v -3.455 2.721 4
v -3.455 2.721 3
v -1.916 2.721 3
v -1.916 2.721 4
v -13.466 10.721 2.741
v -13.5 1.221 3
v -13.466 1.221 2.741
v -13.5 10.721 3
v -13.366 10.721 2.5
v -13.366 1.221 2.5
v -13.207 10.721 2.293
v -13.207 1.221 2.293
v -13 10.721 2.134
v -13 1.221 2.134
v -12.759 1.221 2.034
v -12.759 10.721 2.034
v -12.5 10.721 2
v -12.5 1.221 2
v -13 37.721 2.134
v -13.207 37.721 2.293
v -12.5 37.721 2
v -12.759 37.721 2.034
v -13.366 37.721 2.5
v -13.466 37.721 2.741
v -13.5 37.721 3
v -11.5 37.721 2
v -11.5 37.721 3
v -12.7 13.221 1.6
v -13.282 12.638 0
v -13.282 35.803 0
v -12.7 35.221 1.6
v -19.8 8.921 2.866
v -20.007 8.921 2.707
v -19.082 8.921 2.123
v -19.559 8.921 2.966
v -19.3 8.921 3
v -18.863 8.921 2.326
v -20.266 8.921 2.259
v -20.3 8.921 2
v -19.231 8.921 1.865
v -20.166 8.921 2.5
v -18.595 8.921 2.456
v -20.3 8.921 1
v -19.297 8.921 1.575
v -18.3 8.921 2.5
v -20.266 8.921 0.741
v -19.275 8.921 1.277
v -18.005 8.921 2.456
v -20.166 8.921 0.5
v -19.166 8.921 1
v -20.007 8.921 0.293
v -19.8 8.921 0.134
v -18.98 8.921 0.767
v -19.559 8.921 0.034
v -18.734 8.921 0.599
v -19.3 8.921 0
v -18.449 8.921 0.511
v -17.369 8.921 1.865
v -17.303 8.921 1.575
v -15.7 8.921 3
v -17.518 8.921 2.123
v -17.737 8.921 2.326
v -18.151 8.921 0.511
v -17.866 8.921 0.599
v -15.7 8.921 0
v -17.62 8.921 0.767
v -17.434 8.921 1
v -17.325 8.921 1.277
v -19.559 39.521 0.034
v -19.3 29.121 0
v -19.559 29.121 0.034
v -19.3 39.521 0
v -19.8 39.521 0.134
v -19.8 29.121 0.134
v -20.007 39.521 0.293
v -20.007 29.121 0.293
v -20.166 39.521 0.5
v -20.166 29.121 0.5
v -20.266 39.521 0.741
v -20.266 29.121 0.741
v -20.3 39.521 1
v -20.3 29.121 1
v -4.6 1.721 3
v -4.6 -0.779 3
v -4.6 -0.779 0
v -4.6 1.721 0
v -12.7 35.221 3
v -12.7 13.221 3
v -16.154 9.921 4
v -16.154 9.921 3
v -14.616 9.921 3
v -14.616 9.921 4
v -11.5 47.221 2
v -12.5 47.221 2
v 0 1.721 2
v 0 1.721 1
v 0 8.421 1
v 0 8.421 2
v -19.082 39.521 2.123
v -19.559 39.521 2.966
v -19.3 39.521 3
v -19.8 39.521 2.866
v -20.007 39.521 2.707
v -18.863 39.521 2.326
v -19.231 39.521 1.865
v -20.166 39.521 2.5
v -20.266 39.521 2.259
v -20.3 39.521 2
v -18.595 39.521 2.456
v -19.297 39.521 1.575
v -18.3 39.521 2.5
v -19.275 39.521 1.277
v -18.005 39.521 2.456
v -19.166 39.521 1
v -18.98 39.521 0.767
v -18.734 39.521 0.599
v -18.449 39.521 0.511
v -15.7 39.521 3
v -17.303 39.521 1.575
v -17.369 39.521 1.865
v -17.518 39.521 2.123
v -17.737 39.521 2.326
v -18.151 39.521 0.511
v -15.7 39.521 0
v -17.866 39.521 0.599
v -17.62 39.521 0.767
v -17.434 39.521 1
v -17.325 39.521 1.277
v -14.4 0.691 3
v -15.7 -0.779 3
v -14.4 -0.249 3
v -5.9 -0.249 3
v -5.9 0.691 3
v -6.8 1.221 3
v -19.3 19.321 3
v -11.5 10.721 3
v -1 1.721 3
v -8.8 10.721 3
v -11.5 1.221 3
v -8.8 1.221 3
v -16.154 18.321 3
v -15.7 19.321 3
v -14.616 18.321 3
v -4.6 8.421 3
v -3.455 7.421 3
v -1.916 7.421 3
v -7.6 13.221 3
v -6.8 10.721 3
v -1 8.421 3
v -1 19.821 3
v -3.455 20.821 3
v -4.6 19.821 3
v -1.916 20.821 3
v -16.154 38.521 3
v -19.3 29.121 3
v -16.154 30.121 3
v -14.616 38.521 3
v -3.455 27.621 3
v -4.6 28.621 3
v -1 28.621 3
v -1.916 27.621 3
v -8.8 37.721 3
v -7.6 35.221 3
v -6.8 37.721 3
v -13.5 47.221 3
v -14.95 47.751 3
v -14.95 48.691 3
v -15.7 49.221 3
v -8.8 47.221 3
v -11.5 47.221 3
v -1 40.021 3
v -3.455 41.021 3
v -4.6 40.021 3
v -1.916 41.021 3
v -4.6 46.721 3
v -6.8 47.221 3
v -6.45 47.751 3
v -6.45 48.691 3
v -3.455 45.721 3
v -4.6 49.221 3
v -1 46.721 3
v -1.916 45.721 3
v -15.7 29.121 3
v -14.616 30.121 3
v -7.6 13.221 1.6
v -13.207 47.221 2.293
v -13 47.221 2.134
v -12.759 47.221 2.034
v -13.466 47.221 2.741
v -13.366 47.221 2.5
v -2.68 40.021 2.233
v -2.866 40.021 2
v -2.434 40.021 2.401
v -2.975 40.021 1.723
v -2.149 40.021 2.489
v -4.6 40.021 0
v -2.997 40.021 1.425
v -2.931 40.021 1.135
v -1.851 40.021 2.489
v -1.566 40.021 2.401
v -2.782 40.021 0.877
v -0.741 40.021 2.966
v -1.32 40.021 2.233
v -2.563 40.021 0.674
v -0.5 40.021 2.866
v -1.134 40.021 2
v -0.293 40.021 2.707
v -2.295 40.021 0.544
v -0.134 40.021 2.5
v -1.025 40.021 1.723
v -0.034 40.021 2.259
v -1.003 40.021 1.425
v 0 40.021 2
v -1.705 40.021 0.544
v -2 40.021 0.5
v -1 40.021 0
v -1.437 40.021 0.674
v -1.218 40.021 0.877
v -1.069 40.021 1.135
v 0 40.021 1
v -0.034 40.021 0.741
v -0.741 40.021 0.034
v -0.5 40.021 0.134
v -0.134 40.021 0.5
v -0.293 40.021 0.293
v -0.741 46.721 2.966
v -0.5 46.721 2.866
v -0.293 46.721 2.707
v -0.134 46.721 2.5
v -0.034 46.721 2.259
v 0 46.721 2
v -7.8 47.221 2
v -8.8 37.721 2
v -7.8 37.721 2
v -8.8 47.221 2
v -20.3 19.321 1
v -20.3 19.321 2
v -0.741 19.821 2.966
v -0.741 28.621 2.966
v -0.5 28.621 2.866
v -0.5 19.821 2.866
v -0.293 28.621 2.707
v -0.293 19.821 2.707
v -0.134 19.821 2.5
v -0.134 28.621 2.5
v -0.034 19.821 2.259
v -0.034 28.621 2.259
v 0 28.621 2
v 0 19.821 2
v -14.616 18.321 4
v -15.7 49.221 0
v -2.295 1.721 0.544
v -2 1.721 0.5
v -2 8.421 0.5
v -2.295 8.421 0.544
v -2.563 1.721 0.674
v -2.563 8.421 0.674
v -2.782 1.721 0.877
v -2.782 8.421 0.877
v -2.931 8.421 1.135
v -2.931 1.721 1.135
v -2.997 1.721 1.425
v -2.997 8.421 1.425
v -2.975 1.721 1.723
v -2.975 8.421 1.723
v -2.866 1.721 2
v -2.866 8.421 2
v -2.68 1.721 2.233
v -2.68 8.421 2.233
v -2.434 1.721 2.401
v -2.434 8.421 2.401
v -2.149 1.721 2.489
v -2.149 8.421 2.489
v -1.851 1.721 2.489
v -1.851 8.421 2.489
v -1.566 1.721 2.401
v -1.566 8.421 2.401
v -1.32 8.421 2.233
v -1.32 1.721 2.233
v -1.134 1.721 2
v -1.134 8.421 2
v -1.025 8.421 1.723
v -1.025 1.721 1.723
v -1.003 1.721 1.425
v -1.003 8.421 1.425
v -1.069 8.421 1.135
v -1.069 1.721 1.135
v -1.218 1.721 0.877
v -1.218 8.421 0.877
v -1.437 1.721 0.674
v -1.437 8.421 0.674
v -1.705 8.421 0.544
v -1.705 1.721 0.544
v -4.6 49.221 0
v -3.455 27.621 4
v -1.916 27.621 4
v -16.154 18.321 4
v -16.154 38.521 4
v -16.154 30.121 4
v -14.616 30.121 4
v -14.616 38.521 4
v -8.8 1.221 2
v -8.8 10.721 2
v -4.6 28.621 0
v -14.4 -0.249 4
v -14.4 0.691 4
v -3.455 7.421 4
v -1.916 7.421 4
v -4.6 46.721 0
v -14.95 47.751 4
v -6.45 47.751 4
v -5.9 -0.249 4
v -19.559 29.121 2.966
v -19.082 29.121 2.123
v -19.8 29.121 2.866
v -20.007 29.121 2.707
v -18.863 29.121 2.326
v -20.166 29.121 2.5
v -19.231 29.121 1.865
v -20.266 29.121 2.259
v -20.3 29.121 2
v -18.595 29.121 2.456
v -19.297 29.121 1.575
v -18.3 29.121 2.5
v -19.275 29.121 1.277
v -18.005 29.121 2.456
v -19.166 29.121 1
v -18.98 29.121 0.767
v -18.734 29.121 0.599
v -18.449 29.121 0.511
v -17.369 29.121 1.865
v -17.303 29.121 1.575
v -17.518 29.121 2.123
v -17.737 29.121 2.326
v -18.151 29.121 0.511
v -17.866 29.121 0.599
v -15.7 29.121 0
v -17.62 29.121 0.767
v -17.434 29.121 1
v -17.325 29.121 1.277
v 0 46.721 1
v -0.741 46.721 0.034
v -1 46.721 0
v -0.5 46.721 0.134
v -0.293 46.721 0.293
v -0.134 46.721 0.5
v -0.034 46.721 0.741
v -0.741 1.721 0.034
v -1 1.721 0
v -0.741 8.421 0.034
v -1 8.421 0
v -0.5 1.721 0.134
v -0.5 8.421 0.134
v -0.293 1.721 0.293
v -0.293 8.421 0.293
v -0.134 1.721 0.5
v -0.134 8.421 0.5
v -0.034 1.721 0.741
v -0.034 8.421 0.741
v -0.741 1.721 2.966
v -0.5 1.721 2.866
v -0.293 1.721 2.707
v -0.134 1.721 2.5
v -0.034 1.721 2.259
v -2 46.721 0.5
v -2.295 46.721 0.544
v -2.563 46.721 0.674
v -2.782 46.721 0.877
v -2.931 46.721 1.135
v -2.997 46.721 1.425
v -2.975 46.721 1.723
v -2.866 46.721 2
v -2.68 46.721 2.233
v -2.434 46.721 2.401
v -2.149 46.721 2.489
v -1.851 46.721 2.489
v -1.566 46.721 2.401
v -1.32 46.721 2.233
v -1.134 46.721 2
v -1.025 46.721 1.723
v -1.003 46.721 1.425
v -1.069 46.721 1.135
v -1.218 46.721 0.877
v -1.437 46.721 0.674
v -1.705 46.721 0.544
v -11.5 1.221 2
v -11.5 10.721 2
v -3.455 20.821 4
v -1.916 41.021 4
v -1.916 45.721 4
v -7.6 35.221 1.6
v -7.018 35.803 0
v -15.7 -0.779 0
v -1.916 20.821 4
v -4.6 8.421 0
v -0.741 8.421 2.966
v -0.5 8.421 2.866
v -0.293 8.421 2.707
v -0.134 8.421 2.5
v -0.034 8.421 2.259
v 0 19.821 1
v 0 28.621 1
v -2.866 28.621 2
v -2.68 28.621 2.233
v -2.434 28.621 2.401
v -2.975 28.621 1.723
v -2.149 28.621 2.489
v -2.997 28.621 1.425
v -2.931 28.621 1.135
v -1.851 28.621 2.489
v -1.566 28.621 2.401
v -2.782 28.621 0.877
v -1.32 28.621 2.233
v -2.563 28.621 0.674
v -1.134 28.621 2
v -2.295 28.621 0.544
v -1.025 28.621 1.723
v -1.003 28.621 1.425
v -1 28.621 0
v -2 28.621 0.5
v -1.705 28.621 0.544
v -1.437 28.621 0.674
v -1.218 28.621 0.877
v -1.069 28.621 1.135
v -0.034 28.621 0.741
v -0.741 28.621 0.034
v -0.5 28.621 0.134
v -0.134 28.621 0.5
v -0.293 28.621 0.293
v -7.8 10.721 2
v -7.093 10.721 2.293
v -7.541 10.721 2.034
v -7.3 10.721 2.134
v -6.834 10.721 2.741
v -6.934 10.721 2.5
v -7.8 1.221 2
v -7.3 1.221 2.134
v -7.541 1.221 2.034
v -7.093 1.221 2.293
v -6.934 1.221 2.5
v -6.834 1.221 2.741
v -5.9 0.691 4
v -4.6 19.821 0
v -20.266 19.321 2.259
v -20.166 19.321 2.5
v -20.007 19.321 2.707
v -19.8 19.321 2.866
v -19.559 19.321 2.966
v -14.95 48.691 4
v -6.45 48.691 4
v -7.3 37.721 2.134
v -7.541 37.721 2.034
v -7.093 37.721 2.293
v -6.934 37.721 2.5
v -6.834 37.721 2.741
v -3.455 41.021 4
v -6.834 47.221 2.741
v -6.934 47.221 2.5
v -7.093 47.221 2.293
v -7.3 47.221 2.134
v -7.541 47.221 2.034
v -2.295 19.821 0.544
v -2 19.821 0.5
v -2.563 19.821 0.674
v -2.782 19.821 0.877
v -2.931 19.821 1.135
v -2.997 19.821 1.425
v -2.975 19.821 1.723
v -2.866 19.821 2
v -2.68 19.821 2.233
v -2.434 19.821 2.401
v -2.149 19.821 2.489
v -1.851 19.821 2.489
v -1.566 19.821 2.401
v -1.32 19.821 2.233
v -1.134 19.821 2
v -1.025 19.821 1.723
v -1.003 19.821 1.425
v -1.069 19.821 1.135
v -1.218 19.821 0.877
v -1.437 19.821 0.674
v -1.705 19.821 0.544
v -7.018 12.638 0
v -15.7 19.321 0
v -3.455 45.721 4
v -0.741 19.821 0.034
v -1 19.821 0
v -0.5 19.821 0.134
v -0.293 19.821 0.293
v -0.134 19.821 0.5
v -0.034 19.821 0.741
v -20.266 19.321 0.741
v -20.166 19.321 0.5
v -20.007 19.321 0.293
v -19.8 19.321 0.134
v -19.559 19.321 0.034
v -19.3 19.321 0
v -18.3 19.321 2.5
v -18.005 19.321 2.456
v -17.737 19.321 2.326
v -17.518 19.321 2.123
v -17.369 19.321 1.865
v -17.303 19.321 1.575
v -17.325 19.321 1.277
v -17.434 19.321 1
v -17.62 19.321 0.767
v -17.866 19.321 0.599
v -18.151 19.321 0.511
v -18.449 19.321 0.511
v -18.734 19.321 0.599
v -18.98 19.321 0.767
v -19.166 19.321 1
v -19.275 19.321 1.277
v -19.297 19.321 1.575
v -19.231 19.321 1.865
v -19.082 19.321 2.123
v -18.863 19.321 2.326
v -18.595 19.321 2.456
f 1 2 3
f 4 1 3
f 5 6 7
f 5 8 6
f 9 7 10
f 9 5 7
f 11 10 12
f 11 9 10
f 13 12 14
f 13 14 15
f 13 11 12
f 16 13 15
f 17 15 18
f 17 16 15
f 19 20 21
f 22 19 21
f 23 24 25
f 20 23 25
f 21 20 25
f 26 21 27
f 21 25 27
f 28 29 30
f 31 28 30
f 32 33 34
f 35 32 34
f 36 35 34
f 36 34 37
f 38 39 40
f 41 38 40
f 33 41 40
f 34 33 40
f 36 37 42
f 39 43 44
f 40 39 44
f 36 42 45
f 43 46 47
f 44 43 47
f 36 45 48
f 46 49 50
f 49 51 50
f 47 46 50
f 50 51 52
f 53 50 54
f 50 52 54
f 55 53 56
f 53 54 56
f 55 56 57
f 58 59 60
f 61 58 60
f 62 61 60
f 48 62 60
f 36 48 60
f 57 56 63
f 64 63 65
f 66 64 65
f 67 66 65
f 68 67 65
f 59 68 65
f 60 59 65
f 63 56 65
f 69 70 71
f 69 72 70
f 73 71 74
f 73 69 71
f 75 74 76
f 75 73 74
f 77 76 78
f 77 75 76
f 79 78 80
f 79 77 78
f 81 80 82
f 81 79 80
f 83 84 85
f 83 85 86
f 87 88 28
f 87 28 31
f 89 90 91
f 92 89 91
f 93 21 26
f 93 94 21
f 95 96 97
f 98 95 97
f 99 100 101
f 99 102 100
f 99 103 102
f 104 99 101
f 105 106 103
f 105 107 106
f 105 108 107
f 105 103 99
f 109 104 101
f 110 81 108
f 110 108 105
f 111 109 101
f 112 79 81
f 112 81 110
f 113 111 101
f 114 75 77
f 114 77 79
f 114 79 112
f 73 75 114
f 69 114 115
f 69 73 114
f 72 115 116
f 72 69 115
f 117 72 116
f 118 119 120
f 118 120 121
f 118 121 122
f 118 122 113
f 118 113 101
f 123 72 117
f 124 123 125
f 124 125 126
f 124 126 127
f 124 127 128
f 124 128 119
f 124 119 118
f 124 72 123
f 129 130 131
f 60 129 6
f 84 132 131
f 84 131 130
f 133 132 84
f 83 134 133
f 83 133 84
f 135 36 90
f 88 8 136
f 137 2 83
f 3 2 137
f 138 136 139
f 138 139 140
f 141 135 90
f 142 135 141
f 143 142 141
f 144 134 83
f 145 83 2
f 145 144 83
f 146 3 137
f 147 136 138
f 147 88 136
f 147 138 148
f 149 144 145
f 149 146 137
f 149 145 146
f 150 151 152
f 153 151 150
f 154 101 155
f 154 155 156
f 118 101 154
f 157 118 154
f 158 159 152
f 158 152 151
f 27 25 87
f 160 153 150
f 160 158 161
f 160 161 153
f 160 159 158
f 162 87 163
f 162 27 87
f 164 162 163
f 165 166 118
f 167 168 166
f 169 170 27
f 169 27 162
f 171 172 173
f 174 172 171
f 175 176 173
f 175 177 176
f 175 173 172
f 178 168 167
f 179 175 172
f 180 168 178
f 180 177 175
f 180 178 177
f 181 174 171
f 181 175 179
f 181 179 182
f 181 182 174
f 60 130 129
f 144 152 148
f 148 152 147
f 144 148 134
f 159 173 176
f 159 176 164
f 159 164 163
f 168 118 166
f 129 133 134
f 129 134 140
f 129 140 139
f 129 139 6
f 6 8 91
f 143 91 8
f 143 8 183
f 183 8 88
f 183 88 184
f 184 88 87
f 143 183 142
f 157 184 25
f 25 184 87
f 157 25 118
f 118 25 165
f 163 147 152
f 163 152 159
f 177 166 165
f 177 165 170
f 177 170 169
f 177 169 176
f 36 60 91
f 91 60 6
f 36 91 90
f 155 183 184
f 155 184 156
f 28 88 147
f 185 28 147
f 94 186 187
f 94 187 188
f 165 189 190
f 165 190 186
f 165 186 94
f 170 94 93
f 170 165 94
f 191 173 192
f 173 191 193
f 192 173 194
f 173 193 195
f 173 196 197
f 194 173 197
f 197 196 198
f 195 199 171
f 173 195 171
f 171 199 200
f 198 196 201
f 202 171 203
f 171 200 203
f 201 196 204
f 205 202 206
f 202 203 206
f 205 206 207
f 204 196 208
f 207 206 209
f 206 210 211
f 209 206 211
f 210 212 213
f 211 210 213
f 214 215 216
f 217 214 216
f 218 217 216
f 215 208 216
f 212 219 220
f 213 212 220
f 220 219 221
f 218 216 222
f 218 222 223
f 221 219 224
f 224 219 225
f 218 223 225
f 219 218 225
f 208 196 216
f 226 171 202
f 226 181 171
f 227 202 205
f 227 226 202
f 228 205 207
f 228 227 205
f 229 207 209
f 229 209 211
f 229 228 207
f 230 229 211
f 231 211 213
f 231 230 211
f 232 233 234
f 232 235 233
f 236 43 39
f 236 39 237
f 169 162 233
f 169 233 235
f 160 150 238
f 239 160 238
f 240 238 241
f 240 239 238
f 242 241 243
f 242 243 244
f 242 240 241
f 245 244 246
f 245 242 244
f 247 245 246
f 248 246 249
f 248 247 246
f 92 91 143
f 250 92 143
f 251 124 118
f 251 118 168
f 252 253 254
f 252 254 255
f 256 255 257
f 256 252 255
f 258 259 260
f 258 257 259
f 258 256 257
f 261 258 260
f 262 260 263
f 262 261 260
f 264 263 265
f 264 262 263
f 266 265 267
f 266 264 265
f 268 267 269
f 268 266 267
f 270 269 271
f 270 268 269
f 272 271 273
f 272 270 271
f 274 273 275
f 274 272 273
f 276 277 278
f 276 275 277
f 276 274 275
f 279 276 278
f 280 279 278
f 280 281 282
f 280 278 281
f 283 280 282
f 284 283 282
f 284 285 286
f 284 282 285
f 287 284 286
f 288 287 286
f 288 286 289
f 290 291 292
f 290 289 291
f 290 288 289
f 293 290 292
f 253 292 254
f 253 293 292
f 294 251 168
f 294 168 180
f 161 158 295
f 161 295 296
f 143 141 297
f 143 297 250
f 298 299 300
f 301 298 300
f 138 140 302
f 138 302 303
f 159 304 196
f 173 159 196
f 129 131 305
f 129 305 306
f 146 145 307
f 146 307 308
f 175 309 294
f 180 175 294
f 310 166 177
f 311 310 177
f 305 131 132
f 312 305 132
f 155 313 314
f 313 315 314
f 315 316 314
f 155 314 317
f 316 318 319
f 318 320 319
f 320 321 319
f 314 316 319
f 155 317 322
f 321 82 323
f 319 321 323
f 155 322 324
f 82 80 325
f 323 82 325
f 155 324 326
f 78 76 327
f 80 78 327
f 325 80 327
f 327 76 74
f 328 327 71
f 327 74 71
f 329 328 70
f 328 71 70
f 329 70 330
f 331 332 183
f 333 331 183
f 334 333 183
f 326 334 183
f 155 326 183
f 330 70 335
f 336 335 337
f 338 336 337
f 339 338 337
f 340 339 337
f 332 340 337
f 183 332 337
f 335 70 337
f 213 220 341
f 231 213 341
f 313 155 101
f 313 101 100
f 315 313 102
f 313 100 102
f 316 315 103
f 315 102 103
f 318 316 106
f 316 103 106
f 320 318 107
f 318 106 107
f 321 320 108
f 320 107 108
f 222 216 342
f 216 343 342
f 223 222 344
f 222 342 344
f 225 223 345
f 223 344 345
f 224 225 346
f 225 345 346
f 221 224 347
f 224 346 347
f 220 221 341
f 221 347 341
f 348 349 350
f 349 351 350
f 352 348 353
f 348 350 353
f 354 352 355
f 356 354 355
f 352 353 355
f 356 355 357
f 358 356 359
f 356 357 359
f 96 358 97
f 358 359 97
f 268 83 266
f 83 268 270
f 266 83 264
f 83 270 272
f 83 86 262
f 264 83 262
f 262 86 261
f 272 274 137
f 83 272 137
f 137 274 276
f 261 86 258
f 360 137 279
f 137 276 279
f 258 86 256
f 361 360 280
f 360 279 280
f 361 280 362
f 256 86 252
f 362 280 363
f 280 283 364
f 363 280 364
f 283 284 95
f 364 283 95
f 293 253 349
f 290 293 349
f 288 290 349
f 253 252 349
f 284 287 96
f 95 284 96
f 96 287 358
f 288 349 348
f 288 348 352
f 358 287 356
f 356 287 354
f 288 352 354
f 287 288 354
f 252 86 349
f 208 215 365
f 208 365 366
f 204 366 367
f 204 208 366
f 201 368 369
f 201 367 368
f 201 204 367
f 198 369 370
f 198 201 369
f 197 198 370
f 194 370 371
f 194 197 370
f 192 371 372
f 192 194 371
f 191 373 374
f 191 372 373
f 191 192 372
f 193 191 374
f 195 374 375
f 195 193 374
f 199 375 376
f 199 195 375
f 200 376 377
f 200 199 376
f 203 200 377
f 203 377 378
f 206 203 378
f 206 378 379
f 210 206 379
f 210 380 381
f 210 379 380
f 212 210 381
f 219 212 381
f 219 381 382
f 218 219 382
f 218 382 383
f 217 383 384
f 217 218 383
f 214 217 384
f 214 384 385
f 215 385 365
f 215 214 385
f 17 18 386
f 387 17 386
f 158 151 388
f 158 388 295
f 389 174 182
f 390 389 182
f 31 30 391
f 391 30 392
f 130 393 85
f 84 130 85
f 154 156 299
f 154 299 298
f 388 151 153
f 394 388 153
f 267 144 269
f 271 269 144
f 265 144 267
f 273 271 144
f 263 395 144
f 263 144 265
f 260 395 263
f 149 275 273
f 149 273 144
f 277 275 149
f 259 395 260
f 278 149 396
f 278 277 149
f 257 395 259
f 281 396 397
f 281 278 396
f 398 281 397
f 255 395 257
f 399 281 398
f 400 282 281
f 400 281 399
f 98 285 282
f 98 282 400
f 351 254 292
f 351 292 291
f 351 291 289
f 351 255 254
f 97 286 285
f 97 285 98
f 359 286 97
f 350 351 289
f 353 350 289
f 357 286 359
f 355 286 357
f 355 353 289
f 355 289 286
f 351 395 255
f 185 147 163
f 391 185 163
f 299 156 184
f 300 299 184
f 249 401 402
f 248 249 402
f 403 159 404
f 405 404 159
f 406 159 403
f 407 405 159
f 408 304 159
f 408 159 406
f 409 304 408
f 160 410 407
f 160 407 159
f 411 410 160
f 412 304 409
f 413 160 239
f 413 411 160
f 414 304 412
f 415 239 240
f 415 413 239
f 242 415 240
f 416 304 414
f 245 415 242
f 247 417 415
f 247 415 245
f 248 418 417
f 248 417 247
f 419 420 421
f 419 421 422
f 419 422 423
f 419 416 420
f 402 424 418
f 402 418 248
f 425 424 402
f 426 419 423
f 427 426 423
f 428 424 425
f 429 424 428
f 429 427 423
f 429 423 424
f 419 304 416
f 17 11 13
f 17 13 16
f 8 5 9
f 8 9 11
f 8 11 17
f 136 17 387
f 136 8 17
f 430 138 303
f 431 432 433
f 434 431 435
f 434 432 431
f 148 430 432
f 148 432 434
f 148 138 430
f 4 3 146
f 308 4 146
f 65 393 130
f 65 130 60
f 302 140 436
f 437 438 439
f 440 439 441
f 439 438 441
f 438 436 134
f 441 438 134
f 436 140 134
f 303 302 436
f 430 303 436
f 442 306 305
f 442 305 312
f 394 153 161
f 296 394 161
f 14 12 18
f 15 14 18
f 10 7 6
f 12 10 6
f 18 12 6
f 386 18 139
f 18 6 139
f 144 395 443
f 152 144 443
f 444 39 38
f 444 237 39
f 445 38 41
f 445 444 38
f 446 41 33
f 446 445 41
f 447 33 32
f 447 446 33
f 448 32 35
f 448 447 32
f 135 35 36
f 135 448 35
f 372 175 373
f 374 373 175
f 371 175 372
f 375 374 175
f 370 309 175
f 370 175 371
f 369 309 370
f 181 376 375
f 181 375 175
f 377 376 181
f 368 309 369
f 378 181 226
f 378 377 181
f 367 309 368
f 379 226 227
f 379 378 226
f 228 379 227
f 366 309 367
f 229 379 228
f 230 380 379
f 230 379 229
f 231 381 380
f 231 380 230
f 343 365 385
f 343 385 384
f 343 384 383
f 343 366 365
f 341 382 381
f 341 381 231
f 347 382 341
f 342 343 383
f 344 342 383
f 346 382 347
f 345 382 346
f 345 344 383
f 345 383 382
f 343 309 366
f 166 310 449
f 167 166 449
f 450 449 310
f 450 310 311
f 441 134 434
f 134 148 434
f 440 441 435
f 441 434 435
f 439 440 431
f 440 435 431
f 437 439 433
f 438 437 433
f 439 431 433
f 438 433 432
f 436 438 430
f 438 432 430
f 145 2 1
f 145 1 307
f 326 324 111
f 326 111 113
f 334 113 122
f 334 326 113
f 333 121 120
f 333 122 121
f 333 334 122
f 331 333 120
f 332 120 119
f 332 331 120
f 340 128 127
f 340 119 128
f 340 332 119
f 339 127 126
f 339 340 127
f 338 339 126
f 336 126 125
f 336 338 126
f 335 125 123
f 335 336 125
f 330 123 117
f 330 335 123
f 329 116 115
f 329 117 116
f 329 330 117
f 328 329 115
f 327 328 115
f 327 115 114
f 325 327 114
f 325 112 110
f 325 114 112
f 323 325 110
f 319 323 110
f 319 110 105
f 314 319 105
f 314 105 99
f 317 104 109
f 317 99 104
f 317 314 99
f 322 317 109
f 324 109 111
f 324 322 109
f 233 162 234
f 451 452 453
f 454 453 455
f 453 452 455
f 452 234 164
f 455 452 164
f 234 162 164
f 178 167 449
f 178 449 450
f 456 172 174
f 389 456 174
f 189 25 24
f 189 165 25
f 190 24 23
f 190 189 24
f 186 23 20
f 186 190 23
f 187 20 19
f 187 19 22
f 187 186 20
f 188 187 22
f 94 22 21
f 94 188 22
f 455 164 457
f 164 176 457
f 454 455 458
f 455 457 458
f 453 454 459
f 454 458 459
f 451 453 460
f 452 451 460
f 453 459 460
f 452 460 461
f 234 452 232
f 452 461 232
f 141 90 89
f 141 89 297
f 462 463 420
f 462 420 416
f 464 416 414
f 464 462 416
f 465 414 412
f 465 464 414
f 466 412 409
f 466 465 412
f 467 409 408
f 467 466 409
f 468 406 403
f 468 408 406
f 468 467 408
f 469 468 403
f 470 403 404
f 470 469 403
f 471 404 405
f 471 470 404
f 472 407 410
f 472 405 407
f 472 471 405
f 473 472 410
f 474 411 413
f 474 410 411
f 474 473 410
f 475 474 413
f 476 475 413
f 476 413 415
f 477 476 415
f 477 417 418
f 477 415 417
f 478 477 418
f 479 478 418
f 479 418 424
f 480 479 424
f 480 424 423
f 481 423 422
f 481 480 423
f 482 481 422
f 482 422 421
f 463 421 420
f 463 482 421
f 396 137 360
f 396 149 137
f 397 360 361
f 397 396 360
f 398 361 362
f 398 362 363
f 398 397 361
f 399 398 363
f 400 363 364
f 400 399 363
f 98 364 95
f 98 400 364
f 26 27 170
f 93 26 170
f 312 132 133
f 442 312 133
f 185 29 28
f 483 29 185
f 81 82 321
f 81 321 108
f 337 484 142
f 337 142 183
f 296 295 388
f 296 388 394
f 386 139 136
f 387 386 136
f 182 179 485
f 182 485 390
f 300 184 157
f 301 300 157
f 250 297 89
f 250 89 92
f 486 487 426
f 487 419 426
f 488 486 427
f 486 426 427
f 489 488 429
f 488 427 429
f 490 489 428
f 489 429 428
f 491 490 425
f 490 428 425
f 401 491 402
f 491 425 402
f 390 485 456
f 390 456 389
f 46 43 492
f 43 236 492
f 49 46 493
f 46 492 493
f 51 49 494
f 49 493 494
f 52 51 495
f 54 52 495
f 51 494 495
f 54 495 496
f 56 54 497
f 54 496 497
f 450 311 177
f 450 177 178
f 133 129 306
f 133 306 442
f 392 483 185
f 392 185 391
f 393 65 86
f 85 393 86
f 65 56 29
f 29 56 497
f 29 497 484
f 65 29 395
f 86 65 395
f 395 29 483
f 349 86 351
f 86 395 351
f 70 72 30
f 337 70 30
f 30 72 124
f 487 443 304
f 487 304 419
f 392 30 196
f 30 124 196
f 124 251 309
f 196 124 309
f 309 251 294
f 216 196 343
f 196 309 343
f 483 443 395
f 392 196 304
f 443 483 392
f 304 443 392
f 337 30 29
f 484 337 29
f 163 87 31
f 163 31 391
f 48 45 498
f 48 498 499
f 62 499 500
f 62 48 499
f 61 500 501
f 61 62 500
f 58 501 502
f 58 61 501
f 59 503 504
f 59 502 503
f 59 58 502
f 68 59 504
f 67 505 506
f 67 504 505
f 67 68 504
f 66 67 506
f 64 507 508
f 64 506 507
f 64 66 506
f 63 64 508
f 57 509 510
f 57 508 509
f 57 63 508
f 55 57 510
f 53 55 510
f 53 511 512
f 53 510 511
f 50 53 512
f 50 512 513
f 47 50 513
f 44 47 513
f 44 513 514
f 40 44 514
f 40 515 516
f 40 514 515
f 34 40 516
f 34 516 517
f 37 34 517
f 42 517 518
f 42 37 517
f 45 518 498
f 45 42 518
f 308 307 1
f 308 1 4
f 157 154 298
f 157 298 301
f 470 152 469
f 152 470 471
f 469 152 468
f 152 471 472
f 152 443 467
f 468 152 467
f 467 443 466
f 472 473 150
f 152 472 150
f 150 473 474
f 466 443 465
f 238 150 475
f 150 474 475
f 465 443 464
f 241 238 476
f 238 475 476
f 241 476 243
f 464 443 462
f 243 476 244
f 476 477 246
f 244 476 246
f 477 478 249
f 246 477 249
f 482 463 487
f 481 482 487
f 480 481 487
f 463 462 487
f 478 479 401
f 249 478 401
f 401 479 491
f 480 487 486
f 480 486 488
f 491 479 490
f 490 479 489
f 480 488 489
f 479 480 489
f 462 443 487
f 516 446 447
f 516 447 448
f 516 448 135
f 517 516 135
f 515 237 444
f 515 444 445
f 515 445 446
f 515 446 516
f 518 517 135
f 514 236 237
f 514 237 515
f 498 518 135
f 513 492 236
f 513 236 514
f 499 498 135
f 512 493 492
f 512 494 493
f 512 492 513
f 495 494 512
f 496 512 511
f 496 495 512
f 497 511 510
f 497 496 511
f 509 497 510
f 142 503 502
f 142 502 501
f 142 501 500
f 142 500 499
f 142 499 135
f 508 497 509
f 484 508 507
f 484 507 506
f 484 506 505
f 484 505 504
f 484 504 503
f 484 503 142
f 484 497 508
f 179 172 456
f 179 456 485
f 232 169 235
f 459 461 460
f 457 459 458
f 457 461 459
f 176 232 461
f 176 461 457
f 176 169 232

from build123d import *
from OCP.BRepFilletAPI import BRepFilletAPI_MakeChamfer

# Parameters (mm, degrees)
SKIZZE1_W                            = 4.6
SKIZZE1_H                            = 10.4
SKIZZE1_W_2                          = 11.1
SKIZZE1_H_2                          = 50
SKIZZE1_H_3                          = 6.7
SKIZZE1_H_4                          = 8.8
AUFSATZ_LINEAR_AUSTRAGEN1_DEPTH      = 3
SCHNITT_LINEAR_AUSTRAGEN1_DEPTH      = 37.5
SCHNITT_LINEAR_AUSTRAGEN1_DEPTH_BACK = 67.5
SKIZZE2_R                            = 1
SKIZZE3_W                            = 5.1
SKIZZE3_H                            = 22
SCHNITT_LINEAR_AUSTRAGEN2_DEPTH      = 7.5
VERRUNDUNG4_R                        = 1
SKIZZE4_W                            = 2
SKIZZE4_H                            = 9.5
SCHNITT_LINEAR_AUSTRAGEN3_DEPTH      = 1
VERRUNDUNG5_R                        = 1
SKIZZE7_W                            = 8.5
SKIZZE7_H                            = 0.94
SKIZZE7_W_2                          = 1.53828676
SKIZZE7_H_2                          = 8.4
SKIZZE7_H_3                          = 4.7
SKIZZE7_H_4                          = 6.8
AUFSATZ_LINEAR_AUSTRAGEN4_DEPTH      = 1
FASE1_SIZE                           = 1.6
FASE1_SIZE2                          = 0.582352375


with BuildPart() as part:
    # Skizze1 → Aufsatz-Linear austragen1 (new body)
    with BuildSketch(Plane.XY):
        with Locations((-18, 14.120550309)):
            Rectangle(SKIZZE1_W, SKIZZE1_H)
        with Locations((-10.15, 24.220550309)):
            Rectangle(SKIZZE1_W_2, SKIZZE1_H_2)
        with Locations((-18, 34.320550309)):
            Rectangle(SKIZZE1_W, SKIZZE1_H)
        with Locations((-2.3, 43.370550309)):
            Rectangle(SKIZZE1_W, SKIZZE1_H_3)
        with Locations((-2.3, 5.070550309)):
            Rectangle(SKIZZE1_W, SKIZZE1_H_3)
        with Locations((-2.3, 24.220550309)):
            Rectangle(SKIZZE1_W, SKIZZE1_H_4)
    extrude(amount=AUFSATZ_LINEAR_AUSTRAGEN1_DEPTH)

    # Skizze2 → Schnitt-Linear austragen1 (cut, two sides: drawn at the far end of the back side and taken through both)
    with BuildSketch(Plane(origin=(0, 39.520550309, 0), x_dir=(1, 0, 0), z_dir=(0, 1, 0)).offset(-SCHNITT_LINEAR_AUSTRAGEN1_DEPTH_BACK)):
        with Locations(Location((-18.3, -1.5, 0), (0, 0, 270))):
            Circle(SKIZZE2_R)
        with Locations(Location((-2, -1.5, 0), (0, 0, 90))):
            Circle(SKIZZE2_R)
    extrude(amount=SCHNITT_LINEAR_AUSTRAGEN1_DEPTH + SCHNITT_LINEAR_AUSTRAGEN1_DEPTH_BACK, mode=Mode.SUBTRACT)

    # Skizze3 → Schnitt-Linear austragen2 (cut)
    with BuildSketch(Plane.XY.offset(3)):
        with Locations((-10.15, 24.220550309)):
            Rectangle(SKIZZE3_W, SKIZZE3_H)
    extrude(amount=-SCHNITT_LINEAR_AUSTRAGEN2_DEPTH, mode=Mode.SUBTRACT)

    # Verrundung4
    verrundung4_edges = [part.edges().sort_by_distance(p)[0] for p in [
        (-20.3, 14.120550309, 3),
        (-20.3, 34.320550309, 3),
        (-20.3, 34.320550309, 0),
        (0, 43.370550309, 0),
        (0, 24.220550309, 0),
        (0, 5.070550309, 0),
        (-20.3, 14.120550309, 0),
        (0, 5.070550309, 3),
        (0, 24.220550309, 3),
        (0, 43.370550309, 3),
    ]]
    fillet(verrundung4_edges, radius=VERRUNDUNG4_R)

    # Skizze4 → Schnitt-Linear austragen3 (cut)
    with BuildSketch(Plane.XY.offset(3)):
        with Locations((-12.5, 42.470550309)):
            Rectangle(SKIZZE4_W, SKIZZE4_H)
        with Locations((-12.5, 5.970550309)):
            Rectangle(SKIZZE4_W, SKIZZE4_H)
        with Locations((-7.8, 42.470550309)):
            Rectangle(SKIZZE4_W, SKIZZE4_H)
        with Locations((-7.8, 5.970550309)):
            Rectangle(SKIZZE4_W, SKIZZE4_H)
    extrude(amount=-SCHNITT_LINEAR_AUSTRAGEN3_DEPTH, mode=Mode.SUBTRACT)

    # Verrundung5
    verrundung5_edges = [part.edges().sort_by_distance(p)[0] for p in [
        (-6.8, 5.970550309, 2),
        (-13.5, 5.970550309, 2),
        (-13.5, 42.470550309, 2),
        (-6.8, 42.470550309, 2),
    ]]
    fillet(verrundung5_edges, radius=VERRUNDUNG5_R - 0.0001)  # a hair under: the kernel refuses the full size

    # Skizze7 → Aufsatz-Linear austragen4 (add)
    with BuildSketch(Plane.XY.offset(3)):
        with Locations((-10.7, 48.220550309)):
            Rectangle(SKIZZE7_W, SKIZZE7_H)
        with Locations((-10.15, 0.220550309)):
            Rectangle(SKIZZE7_W, SKIZZE7_H)
        with Locations((-15.385238006, 14.120550309)):
            Rectangle(SKIZZE7_W_2, SKIZZE7_H_2)
        with Locations((-2.685428708, 5.070550309)):
            Rectangle(SKIZZE7_W_2, SKIZZE7_H_3)
        with Locations((-2.685428708, 24.220550309)):
            Rectangle(SKIZZE7_W_2, SKIZZE7_H_4)
        with Locations((-15.385238006, 34.320550309)):
            Rectangle(SKIZZE7_W_2, SKIZZE7_H_2)
        with Locations((-2.685428708, 43.370550309)):
            Rectangle(SKIZZE7_W_2, SKIZZE7_H_3)
    extrude(amount=AUFSATZ_LINEAR_AUSTRAGEN4_DEPTH)

    # Fase1: one chamfer whose edges measure the first distance from different faces: ONE call of the kernel's chamfer builder (chamfer() names one face for all edges)
    fase1_edges_1 = [part.edges().sort_by_distance(p)[0] for p in [
        (-10.15, 35.220550309, 0),
    ]]
    fase1_side_1 = [part.faces().sort_by_distance(p)[0] for p in [
        (-10.15, 35.220550309, 1.5),
    ]]
    fase1_edges_2 = [part.edges().sort_by_distance(p)[0] for p in [
        (-12.7, 24.220550309, 0),
    ]]
    fase1_side_2 = [part.faces().sort_by_distance(p)[0] for p in [
        (-12.7, 24.220550309, 1.5),
    ]]
    fase1_edges_3 = [part.edges().sort_by_distance(p)[0] for p in [
        (-10.15, 13.220550309, 0),
    ]]
    fase1_side_3 = [part.faces().sort_by_distance(p)[0] for p in [
        (-10.15, 13.220550309, 1.5),
    ]]
    fase1_edges_4 = [part.edges().sort_by_distance(p)[0] for p in [
        (-7.6, 24.220550309, 0),
    ]]
    fase1_side_4 = [part.faces().sort_by_distance(p)[0] for p in [
        (-7.6, 24.220550309, 1.5),
    ]]
    fase1 = BRepFilletAPI_MakeChamfer(part.part.solid().wrapped)
    for e in fase1_edges_1:
        fase1.Add(FASE1_SIZE, FASE1_SIZE2, e.wrapped, fase1_side_1[0].wrapped)  # the first distance lies on this face
    for e in fase1_edges_2:
        fase1.Add(FASE1_SIZE, FASE1_SIZE2, e.wrapped, fase1_side_2[0].wrapped)  # the first distance lies on this face
    for e in fase1_edges_3:
        fase1.Add(FASE1_SIZE, FASE1_SIZE2, e.wrapped, fase1_side_3[0].wrapped)  # the first distance lies on this face
    for e in fase1_edges_4:
        fase1.Add(FASE1_SIZE, FASE1_SIZE2, e.wrapped, fase1_side_4[0].wrapped)  # the first distance lies on this face
    add(Compound.cast(fase1.Shape()), mode=Mode.REPLACE)


solid = part.part
